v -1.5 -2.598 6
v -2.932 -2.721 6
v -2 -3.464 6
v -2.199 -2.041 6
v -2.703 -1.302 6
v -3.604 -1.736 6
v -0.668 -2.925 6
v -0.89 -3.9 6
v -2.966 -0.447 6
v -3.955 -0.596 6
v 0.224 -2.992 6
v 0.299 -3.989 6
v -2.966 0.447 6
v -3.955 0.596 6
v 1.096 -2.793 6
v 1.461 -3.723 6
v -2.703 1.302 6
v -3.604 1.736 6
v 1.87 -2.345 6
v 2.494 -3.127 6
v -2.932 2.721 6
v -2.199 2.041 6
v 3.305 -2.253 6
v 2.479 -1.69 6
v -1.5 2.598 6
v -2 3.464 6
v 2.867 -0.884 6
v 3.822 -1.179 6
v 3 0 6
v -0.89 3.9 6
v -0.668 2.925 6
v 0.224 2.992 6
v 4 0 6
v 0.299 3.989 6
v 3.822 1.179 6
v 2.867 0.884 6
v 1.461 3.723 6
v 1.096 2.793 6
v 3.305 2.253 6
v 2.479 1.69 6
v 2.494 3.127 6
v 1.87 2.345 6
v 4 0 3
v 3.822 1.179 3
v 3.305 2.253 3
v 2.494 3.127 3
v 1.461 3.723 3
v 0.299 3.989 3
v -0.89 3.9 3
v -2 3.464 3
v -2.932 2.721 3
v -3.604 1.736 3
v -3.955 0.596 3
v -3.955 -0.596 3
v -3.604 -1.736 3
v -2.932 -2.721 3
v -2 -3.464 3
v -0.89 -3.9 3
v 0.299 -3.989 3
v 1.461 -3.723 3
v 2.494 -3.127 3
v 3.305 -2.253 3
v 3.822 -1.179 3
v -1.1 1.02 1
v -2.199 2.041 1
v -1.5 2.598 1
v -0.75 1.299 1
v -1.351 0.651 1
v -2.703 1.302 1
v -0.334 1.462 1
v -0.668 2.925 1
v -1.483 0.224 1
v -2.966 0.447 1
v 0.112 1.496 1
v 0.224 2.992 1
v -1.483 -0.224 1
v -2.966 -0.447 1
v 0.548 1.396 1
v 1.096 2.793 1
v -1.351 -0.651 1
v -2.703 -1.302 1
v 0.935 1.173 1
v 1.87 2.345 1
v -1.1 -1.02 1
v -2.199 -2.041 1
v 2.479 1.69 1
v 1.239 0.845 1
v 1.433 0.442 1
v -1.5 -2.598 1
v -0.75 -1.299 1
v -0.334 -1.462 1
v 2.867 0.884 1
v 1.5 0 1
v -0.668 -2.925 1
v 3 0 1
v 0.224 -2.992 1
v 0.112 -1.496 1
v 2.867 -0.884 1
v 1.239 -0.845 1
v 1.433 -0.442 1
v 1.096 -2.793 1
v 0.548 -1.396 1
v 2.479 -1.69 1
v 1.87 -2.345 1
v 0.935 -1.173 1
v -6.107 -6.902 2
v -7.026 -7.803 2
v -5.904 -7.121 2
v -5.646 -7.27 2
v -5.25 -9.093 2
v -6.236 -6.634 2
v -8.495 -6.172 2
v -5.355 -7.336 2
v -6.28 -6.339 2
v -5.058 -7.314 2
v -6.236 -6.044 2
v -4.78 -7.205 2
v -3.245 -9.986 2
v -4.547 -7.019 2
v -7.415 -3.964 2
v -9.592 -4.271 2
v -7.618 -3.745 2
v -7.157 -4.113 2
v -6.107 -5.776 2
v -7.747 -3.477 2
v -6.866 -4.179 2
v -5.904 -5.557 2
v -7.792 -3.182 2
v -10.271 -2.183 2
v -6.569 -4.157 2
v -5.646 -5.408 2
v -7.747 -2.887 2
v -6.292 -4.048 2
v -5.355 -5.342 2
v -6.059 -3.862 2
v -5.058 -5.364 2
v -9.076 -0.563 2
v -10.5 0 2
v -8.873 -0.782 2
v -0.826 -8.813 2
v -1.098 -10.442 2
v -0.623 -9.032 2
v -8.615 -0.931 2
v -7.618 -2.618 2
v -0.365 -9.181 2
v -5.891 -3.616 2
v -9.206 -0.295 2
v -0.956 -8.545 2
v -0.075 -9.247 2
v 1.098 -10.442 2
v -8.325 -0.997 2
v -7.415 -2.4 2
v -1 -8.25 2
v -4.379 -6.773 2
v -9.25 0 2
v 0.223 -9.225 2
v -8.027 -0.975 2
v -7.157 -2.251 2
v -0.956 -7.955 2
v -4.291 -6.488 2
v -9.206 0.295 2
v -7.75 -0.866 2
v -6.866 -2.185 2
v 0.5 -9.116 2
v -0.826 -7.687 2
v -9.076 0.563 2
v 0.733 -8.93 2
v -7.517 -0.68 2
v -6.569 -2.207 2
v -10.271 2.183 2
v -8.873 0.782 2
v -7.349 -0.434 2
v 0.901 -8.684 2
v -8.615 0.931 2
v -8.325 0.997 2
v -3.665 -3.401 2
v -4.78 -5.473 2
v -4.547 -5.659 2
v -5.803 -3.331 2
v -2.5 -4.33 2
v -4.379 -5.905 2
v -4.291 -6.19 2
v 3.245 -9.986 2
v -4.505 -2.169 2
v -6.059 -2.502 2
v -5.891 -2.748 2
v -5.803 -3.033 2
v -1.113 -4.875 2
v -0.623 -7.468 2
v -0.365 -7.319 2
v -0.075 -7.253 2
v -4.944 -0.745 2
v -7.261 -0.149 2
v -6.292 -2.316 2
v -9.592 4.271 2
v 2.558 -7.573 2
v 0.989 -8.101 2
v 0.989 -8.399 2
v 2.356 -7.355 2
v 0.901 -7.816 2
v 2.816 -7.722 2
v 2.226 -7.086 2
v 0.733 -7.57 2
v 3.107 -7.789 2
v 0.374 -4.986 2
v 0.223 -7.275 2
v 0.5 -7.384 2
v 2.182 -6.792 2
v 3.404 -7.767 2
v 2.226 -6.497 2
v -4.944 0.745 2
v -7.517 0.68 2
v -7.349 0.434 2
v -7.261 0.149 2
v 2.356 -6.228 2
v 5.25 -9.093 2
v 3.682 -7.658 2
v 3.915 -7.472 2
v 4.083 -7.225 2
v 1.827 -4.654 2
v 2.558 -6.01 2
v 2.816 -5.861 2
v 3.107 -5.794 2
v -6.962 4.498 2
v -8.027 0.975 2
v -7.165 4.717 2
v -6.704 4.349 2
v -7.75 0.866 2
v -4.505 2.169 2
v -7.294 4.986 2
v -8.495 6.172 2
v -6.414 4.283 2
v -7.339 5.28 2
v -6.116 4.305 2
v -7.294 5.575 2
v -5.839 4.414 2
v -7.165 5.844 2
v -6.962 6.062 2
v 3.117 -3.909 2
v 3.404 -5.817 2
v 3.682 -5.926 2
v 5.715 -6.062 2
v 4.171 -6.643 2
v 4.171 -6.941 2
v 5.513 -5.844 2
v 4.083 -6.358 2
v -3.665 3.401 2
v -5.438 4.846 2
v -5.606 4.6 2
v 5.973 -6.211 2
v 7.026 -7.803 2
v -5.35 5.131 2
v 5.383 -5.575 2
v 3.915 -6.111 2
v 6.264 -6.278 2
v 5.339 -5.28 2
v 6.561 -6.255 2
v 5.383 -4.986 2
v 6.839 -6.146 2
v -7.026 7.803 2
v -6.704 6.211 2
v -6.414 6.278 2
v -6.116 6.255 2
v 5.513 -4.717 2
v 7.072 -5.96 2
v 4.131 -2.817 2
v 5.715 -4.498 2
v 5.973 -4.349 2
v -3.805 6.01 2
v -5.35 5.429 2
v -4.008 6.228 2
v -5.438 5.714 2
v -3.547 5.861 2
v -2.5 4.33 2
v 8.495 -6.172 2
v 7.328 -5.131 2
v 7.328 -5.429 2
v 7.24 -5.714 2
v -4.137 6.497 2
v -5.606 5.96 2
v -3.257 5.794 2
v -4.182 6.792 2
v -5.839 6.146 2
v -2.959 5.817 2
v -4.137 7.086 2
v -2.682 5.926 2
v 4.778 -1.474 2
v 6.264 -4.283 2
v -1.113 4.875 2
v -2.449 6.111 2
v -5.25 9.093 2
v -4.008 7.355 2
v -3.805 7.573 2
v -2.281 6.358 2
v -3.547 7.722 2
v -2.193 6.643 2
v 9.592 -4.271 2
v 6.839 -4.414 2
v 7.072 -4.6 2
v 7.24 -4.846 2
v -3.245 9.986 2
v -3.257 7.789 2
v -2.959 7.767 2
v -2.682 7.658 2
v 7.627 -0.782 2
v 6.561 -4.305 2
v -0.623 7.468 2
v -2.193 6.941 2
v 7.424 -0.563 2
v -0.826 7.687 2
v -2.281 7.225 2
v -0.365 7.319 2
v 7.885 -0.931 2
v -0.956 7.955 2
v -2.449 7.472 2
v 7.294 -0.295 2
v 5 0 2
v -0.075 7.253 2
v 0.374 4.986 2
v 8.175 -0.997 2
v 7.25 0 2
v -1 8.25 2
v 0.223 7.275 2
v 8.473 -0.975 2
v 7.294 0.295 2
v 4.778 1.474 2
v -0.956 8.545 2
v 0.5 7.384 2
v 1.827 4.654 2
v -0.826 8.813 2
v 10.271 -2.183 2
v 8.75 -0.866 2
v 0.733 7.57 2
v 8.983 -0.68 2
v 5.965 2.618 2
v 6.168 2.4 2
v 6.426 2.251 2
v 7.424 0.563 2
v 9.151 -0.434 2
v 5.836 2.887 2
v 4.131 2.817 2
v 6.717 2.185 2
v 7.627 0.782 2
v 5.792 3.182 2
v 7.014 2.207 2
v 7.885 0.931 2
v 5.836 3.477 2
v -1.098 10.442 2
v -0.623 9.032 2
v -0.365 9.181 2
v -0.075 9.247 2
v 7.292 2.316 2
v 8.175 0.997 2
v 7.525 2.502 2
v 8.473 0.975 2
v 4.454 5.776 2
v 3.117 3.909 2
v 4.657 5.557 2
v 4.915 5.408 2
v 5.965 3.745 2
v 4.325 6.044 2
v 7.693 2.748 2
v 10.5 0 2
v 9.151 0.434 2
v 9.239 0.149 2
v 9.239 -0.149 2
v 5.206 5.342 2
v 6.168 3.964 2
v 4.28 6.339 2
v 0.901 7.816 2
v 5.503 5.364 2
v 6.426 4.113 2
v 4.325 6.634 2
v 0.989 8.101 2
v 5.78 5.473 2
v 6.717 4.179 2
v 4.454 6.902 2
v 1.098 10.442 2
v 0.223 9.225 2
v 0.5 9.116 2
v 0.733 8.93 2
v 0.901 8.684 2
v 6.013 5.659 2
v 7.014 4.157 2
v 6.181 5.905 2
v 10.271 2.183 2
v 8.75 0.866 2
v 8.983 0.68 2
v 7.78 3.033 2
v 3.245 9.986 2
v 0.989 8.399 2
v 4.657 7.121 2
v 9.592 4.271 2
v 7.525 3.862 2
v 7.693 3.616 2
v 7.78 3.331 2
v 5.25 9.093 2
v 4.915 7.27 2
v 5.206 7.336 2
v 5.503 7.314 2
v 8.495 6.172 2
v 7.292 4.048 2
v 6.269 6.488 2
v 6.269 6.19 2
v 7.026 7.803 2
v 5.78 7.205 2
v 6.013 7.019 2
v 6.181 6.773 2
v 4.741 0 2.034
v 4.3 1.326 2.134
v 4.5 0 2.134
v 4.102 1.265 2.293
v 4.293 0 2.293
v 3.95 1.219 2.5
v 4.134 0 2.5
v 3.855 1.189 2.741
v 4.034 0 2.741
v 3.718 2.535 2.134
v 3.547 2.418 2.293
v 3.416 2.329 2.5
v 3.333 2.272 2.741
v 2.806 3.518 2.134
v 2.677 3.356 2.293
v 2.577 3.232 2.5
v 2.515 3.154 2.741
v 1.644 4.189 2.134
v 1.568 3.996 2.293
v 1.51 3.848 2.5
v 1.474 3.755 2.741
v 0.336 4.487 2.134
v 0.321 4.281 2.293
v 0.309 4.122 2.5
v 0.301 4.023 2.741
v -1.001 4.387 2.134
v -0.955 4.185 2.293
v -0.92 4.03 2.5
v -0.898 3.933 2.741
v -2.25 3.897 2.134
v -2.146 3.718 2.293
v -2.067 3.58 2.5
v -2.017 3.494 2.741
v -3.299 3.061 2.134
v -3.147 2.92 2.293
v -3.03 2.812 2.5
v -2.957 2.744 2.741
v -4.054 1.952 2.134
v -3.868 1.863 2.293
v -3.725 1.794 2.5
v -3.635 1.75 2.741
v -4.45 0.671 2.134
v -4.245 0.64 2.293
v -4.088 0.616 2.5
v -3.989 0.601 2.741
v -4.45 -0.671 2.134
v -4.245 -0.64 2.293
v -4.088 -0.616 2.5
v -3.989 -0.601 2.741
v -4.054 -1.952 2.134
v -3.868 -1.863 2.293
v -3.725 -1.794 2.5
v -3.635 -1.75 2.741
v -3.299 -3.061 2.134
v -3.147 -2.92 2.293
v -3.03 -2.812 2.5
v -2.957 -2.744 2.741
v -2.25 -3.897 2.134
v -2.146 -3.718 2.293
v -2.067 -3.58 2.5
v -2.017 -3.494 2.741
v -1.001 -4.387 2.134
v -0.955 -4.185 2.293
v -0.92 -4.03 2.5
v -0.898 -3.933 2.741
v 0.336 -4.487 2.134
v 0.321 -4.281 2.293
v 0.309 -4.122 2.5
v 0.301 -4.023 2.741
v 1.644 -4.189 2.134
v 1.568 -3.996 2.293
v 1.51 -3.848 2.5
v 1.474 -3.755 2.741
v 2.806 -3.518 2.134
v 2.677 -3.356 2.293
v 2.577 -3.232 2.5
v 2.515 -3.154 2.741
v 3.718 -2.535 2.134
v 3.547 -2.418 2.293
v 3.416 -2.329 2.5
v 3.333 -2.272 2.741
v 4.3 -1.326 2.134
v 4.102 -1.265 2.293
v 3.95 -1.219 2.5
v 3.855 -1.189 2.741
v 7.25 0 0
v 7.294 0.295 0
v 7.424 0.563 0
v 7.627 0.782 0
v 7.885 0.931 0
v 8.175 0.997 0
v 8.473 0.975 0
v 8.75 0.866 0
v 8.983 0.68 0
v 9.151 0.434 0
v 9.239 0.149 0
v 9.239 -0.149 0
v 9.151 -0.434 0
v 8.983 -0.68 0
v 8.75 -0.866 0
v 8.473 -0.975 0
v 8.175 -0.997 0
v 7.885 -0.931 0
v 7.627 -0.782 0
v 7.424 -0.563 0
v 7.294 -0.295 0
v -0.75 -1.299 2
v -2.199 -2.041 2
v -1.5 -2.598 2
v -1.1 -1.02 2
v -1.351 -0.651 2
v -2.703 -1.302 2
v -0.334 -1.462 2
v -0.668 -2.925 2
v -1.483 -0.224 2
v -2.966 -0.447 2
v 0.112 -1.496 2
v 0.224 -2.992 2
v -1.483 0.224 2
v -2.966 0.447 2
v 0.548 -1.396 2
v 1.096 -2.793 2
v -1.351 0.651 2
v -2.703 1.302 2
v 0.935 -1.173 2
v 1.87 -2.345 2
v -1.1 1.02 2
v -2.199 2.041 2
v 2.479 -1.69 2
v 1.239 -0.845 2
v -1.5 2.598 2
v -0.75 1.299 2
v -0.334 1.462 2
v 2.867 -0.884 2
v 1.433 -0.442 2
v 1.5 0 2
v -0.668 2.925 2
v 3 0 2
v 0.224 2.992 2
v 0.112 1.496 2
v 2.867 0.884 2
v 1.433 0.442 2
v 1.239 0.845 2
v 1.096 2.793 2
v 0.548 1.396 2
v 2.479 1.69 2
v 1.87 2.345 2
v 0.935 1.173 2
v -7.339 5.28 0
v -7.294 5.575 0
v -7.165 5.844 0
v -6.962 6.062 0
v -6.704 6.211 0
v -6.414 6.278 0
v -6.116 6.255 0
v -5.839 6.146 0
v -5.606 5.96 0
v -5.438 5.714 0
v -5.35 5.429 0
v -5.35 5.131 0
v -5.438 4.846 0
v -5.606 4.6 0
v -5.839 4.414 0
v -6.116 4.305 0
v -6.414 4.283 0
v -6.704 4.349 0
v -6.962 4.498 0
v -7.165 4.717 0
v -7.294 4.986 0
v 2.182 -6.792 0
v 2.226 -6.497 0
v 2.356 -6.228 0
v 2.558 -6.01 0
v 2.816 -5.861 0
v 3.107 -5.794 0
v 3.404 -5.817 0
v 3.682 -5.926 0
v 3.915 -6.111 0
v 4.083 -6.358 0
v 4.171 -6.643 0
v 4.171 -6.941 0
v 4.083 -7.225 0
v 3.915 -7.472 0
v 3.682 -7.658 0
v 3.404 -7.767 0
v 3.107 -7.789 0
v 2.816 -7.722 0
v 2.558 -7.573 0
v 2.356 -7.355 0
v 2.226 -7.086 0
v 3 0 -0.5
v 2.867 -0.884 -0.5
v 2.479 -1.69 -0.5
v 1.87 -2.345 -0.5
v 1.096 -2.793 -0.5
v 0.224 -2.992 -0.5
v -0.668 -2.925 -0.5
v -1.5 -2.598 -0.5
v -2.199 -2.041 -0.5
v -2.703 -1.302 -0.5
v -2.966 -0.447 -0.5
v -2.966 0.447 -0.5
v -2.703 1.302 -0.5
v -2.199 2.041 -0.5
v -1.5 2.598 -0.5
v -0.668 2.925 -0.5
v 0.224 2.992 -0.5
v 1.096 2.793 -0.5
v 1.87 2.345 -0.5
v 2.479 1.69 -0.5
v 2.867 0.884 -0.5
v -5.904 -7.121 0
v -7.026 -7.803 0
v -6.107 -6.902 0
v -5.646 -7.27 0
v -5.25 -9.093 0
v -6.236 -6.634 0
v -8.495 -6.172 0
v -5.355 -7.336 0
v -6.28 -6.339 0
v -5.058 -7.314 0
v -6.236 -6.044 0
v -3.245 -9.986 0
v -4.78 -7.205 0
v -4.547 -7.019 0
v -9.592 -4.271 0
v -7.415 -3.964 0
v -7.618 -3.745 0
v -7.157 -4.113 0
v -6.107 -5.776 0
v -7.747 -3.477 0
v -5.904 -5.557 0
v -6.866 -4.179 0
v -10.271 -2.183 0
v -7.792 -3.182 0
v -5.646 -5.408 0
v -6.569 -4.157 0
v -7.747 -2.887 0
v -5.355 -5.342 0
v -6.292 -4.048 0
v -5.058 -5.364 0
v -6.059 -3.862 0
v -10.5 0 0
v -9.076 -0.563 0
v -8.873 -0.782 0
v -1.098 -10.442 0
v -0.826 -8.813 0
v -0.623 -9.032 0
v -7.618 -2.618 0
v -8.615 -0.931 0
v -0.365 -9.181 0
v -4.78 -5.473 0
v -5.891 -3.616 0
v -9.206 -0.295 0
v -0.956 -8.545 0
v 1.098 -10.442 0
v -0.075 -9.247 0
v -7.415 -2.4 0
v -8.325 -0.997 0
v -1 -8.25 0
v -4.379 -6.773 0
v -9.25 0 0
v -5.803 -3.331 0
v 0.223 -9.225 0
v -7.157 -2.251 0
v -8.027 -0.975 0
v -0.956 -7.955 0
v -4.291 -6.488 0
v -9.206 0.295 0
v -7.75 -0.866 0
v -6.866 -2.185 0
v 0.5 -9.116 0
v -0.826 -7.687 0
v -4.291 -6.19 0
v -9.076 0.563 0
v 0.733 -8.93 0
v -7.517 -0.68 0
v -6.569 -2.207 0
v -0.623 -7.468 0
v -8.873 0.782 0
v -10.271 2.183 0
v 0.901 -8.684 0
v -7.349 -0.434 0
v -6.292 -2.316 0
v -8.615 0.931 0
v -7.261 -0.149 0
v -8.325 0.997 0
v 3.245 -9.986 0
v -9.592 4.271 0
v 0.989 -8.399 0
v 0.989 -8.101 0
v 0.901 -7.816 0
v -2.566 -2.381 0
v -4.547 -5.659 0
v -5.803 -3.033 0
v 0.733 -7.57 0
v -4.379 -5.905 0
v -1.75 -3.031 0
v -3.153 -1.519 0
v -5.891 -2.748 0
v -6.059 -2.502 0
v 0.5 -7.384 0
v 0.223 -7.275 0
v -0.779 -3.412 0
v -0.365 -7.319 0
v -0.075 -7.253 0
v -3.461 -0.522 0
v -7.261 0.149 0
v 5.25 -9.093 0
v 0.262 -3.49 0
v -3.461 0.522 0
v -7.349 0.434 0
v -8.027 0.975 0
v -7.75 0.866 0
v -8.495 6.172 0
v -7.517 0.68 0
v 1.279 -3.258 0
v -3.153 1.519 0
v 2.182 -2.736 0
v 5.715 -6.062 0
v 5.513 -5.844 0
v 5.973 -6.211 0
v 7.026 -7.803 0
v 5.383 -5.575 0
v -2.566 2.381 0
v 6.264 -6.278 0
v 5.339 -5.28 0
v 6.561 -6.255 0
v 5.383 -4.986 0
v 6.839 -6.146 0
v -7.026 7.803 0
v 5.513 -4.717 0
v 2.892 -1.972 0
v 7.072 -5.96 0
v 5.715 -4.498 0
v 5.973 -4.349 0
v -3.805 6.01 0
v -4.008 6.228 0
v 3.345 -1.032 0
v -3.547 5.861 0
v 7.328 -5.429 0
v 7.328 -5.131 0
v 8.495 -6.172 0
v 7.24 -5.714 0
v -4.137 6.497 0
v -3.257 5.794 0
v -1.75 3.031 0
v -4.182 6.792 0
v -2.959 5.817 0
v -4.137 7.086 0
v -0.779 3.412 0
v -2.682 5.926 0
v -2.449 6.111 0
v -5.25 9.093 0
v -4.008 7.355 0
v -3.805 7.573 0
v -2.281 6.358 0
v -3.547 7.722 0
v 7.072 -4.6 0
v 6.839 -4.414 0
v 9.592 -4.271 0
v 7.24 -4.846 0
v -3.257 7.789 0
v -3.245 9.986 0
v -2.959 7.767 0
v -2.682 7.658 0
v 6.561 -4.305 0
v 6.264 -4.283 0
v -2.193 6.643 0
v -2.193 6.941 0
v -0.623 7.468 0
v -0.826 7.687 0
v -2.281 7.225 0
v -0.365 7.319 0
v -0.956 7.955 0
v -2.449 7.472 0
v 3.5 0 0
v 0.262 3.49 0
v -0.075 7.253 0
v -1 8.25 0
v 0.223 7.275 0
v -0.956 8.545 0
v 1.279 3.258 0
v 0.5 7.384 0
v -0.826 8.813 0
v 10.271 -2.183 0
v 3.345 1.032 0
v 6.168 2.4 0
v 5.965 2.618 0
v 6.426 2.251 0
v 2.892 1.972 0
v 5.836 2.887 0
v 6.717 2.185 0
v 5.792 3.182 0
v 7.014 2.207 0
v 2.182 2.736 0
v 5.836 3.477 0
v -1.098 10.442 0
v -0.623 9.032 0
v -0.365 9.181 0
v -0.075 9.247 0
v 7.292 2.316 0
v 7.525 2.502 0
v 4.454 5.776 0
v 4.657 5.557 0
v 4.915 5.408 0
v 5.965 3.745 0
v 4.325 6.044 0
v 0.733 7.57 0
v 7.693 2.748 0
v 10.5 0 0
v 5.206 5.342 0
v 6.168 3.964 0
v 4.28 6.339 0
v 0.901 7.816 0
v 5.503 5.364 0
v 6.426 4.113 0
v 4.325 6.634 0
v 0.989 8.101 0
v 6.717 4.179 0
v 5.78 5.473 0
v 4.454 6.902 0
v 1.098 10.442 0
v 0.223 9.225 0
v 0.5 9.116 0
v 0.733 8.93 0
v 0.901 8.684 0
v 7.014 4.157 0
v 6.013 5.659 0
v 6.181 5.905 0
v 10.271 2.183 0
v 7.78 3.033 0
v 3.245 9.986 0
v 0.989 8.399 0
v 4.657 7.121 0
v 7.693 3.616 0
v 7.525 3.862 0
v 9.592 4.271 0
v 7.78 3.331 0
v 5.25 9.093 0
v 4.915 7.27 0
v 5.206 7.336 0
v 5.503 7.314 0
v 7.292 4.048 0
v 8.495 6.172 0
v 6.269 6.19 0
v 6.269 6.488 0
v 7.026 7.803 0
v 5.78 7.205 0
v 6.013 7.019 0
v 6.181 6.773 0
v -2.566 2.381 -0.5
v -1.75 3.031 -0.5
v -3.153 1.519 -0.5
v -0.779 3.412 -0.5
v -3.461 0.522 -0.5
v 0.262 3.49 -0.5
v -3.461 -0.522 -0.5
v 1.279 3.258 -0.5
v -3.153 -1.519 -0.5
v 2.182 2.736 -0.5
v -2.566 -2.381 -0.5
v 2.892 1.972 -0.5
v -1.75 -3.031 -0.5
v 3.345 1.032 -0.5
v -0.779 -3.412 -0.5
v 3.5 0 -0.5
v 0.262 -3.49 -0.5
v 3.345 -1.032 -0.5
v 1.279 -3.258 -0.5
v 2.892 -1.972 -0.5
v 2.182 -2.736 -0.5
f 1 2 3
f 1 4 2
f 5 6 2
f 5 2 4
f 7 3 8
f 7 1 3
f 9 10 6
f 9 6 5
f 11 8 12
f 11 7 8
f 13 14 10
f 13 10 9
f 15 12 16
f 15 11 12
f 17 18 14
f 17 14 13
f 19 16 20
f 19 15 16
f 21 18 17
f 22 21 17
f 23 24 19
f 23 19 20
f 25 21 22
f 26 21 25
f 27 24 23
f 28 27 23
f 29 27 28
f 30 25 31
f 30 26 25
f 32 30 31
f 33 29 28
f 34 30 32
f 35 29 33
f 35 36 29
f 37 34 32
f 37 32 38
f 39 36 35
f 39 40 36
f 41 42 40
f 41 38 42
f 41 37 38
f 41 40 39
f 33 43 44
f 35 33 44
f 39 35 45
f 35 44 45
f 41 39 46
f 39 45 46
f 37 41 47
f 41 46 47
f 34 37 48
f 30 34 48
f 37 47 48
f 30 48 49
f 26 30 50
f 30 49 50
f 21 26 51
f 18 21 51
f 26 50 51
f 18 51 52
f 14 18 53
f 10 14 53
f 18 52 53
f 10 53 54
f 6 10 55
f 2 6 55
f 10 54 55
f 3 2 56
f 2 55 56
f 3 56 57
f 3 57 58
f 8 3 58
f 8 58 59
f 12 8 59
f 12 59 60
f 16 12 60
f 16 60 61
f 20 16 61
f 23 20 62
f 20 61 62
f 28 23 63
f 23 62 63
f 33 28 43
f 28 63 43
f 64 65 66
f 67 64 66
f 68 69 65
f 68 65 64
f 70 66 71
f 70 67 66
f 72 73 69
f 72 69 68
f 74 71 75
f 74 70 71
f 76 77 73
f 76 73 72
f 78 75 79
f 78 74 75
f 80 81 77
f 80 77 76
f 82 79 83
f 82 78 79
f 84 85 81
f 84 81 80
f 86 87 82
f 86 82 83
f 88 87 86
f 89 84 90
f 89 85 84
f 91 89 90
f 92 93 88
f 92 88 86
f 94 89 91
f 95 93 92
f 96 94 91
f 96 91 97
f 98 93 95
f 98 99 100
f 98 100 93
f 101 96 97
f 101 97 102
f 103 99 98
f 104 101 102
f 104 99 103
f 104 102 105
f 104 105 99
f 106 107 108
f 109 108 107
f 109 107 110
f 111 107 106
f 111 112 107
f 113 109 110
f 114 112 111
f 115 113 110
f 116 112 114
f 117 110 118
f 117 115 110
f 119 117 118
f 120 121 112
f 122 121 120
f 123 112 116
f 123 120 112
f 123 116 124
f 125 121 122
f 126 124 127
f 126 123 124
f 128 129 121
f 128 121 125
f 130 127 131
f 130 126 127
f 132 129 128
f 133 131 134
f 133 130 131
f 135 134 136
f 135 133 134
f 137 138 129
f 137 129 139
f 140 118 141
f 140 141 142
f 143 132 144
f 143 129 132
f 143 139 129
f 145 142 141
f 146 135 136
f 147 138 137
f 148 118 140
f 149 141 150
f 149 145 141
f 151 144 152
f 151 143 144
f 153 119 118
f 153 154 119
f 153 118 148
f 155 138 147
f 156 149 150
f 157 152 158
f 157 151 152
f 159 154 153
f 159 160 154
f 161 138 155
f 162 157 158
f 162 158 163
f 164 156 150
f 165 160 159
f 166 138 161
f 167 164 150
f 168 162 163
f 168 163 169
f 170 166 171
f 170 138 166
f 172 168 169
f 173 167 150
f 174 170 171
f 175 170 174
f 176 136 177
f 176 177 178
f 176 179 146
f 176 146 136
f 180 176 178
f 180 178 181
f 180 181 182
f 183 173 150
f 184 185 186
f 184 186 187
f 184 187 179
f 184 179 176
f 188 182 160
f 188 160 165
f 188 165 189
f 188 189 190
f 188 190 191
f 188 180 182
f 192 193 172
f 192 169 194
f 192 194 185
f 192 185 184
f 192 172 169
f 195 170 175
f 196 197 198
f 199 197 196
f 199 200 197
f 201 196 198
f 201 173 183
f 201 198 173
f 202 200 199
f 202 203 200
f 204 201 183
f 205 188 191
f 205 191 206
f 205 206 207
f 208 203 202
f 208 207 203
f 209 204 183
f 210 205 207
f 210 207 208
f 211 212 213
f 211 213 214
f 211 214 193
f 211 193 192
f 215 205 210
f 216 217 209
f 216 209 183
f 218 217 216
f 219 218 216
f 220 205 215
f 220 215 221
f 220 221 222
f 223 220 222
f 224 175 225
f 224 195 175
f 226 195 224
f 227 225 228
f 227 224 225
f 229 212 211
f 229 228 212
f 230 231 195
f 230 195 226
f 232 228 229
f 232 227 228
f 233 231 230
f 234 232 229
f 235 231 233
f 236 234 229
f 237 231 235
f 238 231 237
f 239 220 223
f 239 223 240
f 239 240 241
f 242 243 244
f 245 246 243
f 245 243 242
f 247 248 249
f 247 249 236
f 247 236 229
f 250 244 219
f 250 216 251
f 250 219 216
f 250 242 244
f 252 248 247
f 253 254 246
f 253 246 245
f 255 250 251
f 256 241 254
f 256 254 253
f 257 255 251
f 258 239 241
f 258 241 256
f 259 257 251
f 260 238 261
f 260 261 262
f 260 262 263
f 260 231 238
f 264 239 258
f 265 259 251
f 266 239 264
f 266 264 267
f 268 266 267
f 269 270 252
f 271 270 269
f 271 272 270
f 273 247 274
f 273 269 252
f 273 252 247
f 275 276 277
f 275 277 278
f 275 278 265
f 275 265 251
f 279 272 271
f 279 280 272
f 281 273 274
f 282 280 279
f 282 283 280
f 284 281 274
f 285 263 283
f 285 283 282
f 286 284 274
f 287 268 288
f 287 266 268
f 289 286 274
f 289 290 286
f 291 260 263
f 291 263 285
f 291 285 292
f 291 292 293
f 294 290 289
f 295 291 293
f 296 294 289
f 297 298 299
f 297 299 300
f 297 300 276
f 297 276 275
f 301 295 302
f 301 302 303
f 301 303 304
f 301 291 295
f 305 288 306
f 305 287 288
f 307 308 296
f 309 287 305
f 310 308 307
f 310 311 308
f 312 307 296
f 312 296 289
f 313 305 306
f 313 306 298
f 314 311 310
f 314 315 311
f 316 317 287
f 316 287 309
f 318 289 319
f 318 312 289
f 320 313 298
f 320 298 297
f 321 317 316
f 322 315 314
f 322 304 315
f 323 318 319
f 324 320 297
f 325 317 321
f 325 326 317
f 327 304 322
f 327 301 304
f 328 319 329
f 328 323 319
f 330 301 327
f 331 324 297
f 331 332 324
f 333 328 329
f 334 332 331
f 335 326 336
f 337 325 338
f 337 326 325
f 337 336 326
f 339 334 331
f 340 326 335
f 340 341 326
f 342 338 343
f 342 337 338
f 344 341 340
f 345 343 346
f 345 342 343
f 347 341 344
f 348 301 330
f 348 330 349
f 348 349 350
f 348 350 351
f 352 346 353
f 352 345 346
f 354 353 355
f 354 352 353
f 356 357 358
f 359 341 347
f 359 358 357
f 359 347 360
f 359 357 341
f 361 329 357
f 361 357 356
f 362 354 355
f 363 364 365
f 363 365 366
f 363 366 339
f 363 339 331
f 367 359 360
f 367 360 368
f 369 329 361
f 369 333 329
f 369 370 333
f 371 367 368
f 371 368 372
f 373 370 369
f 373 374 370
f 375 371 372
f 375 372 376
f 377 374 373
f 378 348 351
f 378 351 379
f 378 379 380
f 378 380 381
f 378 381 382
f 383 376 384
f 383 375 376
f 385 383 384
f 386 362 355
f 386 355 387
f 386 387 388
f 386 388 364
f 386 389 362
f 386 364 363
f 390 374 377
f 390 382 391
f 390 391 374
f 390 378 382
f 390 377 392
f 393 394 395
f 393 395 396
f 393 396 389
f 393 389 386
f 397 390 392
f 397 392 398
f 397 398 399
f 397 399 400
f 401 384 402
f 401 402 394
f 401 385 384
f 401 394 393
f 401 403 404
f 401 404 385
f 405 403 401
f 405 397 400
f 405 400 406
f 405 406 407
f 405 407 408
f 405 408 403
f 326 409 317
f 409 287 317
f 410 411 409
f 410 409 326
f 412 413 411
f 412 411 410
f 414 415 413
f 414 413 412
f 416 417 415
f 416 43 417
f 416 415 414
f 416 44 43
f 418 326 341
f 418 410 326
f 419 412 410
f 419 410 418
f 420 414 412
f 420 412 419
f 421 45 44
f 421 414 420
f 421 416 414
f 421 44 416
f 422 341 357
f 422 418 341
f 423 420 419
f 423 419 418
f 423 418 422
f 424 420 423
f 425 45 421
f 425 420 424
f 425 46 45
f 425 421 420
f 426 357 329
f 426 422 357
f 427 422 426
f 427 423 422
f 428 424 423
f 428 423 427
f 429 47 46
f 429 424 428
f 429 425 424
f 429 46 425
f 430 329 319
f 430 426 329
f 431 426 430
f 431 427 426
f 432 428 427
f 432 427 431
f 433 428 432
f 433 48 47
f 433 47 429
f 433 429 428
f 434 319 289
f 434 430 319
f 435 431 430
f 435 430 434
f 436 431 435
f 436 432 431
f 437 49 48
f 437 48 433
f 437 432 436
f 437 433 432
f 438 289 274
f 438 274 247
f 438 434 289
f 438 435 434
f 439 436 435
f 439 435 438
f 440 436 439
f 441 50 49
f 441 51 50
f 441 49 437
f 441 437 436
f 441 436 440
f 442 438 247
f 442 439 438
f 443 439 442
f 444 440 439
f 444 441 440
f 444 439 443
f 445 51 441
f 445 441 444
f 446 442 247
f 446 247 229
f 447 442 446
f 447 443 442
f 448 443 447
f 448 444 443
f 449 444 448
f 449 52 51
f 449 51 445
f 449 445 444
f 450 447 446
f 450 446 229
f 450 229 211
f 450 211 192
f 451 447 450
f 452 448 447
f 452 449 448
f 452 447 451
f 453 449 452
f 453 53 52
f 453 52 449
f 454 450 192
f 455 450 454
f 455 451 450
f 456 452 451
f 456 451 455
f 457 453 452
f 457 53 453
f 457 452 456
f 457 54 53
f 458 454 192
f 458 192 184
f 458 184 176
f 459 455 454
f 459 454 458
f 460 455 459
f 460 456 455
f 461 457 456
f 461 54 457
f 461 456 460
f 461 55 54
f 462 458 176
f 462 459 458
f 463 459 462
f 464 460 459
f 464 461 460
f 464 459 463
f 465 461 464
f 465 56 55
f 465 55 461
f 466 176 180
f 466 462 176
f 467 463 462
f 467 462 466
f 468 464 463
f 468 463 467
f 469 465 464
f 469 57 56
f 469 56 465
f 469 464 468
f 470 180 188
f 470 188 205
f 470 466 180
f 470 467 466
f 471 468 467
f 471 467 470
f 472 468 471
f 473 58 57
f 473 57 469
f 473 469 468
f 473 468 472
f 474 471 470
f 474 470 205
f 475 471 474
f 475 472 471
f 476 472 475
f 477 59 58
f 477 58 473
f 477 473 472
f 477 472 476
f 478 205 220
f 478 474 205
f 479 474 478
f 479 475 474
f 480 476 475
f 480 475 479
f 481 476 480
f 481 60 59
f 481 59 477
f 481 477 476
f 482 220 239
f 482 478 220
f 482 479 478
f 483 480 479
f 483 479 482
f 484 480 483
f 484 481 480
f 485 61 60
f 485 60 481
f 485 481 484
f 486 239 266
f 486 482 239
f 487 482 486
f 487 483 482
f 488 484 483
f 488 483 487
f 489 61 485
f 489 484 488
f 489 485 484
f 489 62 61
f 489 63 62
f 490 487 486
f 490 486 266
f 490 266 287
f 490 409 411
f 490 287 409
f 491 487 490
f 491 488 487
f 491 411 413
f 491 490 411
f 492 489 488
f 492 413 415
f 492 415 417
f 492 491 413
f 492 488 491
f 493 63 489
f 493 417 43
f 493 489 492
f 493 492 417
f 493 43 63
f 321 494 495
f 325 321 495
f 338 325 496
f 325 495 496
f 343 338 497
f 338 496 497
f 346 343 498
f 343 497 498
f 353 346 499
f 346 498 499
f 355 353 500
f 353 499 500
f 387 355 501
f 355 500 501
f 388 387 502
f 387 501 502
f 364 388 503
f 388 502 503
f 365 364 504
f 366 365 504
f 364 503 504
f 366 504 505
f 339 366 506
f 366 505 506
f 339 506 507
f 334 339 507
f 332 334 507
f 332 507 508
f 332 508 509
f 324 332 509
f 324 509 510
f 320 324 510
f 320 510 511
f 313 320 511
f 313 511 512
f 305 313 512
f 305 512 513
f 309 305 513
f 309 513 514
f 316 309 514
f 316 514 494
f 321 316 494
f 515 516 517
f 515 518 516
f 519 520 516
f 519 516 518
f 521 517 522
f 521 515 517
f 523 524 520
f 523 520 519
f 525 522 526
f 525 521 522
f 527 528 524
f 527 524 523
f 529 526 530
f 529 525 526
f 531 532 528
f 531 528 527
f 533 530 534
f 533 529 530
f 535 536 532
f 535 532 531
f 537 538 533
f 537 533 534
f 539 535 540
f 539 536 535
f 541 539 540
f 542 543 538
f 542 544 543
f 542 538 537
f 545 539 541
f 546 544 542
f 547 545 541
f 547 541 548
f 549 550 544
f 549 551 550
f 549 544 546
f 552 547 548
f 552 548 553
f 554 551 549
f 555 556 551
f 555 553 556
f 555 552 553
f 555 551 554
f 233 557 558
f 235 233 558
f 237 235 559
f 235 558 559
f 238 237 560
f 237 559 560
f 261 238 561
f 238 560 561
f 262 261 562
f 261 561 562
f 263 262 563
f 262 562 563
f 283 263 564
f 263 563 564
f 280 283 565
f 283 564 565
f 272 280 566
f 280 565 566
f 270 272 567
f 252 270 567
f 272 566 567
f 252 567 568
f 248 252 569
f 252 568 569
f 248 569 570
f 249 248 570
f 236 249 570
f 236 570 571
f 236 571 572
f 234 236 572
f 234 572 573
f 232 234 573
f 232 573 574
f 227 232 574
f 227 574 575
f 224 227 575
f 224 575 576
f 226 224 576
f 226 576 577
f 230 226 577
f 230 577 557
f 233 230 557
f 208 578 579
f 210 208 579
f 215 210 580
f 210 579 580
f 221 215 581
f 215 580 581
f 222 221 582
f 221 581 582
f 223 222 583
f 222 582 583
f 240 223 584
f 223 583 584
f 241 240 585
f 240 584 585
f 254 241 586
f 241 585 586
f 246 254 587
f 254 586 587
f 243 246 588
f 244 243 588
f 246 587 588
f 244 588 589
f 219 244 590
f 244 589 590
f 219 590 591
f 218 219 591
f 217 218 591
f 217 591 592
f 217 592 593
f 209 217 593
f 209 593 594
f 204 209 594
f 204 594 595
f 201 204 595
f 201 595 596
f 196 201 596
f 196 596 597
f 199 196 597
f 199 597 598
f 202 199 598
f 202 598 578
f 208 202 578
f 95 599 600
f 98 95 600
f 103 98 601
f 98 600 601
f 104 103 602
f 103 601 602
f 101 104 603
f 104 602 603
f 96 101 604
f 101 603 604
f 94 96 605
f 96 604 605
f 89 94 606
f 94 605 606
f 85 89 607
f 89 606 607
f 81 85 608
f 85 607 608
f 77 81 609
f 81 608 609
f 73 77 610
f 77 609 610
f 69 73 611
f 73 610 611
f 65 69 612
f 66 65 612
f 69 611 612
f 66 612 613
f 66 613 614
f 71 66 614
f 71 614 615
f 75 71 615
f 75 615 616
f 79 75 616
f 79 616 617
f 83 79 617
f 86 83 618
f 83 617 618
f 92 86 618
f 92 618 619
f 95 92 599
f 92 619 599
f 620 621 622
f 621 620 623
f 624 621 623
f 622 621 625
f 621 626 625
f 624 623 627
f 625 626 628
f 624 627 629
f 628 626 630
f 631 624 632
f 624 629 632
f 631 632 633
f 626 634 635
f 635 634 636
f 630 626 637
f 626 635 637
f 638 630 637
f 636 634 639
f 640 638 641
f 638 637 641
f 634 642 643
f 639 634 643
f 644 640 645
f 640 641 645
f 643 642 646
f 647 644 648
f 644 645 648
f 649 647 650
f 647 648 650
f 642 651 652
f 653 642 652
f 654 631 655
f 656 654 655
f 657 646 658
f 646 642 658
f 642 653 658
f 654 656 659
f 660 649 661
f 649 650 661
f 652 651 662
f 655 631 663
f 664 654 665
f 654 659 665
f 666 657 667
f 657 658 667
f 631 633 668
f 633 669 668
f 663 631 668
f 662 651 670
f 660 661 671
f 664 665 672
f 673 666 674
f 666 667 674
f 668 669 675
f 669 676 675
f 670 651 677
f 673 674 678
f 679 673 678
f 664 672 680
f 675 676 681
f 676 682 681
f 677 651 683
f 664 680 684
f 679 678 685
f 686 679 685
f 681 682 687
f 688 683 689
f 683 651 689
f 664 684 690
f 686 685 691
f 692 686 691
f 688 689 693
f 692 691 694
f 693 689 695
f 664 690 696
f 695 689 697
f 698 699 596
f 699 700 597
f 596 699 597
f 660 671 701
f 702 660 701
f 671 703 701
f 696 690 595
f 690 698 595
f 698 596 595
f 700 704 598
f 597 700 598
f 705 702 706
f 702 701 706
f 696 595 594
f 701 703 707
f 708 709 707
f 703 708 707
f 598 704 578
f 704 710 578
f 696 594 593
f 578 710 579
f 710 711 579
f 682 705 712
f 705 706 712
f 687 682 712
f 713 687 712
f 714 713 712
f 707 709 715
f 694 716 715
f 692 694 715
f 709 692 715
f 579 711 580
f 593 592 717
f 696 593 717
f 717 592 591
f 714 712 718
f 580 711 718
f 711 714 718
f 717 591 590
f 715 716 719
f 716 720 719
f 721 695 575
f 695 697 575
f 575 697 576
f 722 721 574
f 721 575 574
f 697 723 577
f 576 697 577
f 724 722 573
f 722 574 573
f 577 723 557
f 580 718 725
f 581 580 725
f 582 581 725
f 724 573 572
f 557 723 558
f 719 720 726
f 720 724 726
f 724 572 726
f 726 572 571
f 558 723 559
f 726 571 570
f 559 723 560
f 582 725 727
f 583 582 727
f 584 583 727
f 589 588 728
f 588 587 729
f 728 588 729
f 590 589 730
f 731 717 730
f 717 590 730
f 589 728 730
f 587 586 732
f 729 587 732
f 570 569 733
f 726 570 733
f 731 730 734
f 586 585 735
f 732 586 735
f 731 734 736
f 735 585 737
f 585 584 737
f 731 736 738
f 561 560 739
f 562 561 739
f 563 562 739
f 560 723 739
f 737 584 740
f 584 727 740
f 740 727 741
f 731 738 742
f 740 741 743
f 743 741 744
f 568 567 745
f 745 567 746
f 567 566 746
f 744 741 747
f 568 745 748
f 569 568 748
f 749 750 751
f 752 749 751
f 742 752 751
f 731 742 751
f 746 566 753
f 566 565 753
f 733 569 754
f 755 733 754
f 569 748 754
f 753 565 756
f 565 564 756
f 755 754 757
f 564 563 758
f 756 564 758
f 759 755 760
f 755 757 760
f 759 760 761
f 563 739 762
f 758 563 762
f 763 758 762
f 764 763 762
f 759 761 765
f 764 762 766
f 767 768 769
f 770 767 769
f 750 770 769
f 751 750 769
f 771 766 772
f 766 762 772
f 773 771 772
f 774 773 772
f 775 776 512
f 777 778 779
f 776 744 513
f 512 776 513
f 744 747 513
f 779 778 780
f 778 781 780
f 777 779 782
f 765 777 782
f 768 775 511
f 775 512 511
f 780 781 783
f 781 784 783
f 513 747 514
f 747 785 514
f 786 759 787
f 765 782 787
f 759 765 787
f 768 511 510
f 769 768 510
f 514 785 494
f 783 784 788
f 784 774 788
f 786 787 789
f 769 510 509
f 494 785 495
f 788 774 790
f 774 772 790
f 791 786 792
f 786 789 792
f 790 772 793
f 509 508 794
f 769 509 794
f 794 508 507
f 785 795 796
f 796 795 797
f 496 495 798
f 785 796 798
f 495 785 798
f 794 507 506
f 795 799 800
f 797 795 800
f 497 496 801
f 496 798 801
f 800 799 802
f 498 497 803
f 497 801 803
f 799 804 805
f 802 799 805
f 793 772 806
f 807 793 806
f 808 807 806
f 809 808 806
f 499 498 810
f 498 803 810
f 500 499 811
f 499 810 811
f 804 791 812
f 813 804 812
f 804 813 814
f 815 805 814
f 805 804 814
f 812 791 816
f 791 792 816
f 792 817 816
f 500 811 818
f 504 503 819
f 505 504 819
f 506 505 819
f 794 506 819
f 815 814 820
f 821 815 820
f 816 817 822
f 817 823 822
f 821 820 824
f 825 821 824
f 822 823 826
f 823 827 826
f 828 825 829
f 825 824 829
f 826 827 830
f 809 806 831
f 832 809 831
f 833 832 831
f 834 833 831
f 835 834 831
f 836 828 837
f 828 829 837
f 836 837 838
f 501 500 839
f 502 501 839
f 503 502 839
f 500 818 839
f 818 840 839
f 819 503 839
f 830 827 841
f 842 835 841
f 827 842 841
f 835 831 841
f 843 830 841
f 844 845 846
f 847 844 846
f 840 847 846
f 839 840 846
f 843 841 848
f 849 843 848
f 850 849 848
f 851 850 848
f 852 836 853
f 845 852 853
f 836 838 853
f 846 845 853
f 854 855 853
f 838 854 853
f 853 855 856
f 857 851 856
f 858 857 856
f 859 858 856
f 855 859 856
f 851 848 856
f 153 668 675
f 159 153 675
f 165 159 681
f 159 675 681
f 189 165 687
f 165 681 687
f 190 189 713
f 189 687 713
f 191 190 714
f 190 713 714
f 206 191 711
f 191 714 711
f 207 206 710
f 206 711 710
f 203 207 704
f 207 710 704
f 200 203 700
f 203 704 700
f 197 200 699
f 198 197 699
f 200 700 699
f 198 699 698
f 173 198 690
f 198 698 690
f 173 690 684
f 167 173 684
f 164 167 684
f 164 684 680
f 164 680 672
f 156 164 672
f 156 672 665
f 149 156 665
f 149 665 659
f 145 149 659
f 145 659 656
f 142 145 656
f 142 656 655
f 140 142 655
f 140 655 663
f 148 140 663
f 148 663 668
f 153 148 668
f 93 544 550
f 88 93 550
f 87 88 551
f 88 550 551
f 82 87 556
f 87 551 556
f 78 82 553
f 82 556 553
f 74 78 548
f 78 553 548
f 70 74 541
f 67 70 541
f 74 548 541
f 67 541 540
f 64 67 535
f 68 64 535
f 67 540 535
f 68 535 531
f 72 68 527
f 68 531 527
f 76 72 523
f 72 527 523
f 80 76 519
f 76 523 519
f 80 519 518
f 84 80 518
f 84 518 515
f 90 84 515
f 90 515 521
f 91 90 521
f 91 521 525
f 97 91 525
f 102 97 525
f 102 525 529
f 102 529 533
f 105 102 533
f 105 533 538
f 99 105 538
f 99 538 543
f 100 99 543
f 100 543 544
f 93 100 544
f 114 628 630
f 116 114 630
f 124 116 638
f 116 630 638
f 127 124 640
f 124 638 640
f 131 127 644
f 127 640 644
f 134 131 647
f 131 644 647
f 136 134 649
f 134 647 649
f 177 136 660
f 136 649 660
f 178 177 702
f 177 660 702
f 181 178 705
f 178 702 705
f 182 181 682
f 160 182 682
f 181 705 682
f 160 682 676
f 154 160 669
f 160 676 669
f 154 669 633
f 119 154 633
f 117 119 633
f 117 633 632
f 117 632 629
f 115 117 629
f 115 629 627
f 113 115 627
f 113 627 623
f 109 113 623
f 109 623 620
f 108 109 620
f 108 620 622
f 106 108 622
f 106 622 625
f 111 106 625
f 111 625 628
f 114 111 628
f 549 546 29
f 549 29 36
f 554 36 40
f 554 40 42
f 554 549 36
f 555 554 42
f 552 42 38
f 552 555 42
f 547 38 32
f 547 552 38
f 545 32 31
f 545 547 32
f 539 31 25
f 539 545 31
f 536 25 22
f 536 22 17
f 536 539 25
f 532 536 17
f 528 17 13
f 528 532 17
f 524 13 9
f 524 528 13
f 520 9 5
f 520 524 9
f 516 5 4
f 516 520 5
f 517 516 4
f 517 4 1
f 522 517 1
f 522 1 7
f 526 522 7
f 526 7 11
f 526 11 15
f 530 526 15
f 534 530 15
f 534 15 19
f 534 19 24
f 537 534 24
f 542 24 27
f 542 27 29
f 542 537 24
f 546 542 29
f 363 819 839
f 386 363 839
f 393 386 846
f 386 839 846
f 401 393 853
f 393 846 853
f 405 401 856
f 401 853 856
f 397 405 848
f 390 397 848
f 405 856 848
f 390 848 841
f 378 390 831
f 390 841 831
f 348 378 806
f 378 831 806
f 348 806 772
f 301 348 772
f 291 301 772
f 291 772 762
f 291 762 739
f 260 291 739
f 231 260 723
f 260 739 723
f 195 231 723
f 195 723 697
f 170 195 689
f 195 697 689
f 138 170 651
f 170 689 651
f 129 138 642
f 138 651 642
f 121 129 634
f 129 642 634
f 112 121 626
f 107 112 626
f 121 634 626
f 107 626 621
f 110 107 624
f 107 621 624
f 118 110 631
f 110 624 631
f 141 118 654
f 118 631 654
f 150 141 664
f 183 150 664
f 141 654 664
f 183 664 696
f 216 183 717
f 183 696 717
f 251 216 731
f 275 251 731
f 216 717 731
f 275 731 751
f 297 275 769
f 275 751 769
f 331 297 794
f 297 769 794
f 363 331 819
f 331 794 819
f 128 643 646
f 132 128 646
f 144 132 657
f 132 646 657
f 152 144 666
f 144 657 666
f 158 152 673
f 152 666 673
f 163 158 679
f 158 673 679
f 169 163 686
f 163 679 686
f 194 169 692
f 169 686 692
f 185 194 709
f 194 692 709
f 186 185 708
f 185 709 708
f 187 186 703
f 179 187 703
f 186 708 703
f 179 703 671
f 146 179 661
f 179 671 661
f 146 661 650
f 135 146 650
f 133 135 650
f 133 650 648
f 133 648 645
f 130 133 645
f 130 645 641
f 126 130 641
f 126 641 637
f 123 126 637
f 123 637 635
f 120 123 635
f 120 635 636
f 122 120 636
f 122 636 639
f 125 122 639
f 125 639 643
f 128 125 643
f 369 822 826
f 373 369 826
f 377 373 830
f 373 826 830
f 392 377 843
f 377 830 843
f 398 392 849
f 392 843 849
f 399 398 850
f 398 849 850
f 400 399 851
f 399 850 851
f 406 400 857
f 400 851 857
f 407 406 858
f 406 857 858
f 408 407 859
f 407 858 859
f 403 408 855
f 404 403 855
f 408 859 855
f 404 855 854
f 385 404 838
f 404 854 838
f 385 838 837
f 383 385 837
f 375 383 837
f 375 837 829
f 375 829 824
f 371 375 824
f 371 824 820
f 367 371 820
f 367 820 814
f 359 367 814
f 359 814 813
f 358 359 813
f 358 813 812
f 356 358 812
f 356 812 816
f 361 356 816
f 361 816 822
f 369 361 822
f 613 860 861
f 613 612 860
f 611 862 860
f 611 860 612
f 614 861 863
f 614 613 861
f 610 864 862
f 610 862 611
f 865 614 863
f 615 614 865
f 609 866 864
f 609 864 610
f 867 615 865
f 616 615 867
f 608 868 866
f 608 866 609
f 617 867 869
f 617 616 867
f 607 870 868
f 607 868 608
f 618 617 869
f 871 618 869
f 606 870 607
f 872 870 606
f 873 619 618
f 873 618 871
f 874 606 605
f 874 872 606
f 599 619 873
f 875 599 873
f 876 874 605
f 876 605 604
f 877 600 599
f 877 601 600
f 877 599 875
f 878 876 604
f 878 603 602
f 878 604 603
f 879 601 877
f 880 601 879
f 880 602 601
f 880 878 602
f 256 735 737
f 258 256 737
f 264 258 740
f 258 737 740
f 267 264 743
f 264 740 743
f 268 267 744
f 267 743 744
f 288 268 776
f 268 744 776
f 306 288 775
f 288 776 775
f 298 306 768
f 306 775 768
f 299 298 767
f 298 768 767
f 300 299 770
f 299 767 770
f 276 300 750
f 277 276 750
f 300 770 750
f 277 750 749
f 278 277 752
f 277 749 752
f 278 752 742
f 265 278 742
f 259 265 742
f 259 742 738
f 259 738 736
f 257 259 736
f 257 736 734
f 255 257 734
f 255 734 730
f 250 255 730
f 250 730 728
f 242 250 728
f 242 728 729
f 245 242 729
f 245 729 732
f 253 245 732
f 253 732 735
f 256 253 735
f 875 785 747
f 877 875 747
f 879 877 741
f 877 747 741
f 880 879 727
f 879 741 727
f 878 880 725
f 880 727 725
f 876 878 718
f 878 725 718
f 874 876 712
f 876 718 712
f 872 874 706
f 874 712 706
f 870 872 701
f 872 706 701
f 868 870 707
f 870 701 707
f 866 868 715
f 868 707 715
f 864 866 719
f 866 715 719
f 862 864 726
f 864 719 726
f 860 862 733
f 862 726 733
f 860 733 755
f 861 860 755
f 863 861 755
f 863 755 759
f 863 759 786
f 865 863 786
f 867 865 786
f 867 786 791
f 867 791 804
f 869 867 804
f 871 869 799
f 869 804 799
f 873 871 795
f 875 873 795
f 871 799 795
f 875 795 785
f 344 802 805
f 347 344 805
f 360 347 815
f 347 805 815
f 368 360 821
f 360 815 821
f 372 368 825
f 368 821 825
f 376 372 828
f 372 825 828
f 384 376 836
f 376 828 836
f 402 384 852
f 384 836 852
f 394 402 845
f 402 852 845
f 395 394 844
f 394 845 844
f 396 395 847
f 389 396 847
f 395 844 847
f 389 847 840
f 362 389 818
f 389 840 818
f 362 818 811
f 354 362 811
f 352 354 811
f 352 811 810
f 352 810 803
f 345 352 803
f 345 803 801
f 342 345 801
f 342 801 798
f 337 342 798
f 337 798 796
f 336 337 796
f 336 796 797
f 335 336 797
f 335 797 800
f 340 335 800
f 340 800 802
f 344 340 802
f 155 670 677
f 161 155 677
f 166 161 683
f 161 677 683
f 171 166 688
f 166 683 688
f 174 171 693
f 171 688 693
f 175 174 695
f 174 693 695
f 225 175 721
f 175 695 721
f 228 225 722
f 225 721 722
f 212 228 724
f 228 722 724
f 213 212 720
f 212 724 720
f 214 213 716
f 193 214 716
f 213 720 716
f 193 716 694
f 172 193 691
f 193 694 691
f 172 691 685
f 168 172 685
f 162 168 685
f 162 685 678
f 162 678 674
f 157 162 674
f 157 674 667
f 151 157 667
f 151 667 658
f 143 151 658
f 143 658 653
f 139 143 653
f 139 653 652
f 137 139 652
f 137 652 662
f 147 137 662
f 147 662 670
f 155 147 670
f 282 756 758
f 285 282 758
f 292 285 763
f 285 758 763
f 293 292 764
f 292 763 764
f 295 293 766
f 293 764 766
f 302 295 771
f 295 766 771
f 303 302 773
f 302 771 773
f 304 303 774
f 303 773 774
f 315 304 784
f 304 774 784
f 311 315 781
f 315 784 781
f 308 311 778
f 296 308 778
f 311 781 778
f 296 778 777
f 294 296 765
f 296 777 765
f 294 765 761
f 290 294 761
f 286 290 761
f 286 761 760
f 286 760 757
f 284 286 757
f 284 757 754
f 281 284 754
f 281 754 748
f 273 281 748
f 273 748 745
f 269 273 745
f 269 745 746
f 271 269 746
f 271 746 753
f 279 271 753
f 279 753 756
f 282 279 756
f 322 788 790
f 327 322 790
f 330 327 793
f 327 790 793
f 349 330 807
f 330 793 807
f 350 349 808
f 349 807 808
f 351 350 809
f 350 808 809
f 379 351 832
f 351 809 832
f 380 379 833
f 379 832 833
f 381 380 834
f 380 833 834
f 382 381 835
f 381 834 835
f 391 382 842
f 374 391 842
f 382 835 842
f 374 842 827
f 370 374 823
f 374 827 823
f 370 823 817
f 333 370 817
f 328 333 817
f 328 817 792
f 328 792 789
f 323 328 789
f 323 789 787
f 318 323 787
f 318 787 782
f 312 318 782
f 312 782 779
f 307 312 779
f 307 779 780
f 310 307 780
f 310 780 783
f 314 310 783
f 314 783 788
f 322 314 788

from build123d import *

# Parameters (mm, degrees)
SKETCH_1_R          = 10.5
EXTRUDE_1_DEPTH     = 2
SKETCH_2_R          = 4
SKETCH_2_R_2        = 3
EXTRUDE_2_DEPTH     = 4
SKETCH_5_R          = 1.5
CUT_EXTRUDE_2_DEPTH = 16.378556499
FILLET_1_R          = 1
SKETCH_6_R          = 3.5
EXTRUDE_3_DEPTH     = 0.5
SKETCH_8_R          = 3
CUT_EXTRUDE_3_DEPTH = 1.5
SKETCH_9_R          = 1
CUT_EXTRUDE_5_DEPTH = 17.015617378


with BuildPart() as part:
    # 草圖1 → 伸長1 (new body)
    with BuildSketch(Plane.XY):
        Circle(SKETCH_1_R)
    extrude(amount=EXTRUDE_1_DEPTH)

    # 草圖2 → 伸長2 (add)
    with BuildSketch(Plane.XY.offset(2)):
        Circle(SKETCH_2_R)
        Circle(SKETCH_2_R_2, mode=Mode.SUBTRACT)
    extrude(amount=EXTRUDE_2_DEPTH)

    # 草圖5 → 除料-伸長2 (cut, through all)
    with BuildSketch(Plane.XY.offset(2)):
        Circle(SKETCH_5_R)
    extrude(amount=-CUT_EXTRUDE_2_DEPTH, mode=Mode.SUBTRACT)

    # 圓角1
    fillet_1_edges = [part.edges().sort_by_distance(p)[0] for p in [
        (-4, 0, 2),
    ]]
    fillet(fillet_1_edges, radius=FILLET_1_R)

    # 草圖6 → 伸長3 (add)
    with BuildSketch(Plane(origin=(0, 0, 0), x_dir=(-1, 0, 0), z_dir=(0, 0, -1))):
        with Locations(Location((0, 0, 0), (0, 0, 180))):
            Circle(SKETCH_6_R)
    extrude(amount=EXTRUDE_3_DEPTH)

    # 草圖8 → 除料-伸長3 (cut)
    with BuildSketch(Plane(origin=(0, 0, -0.5), x_dir=(-1, 0, 0), z_dir=(0, 0, -1))):
        with Locations(Location((0, 0, 0), (0, 0, 180))):
            Circle(SKETCH_8_R)
    extrude(amount=-CUT_EXTRUDE_3_DEPTH, mode=Mode.SUBTRACT)

    # 草圖9 → 除料-伸長5 (cut, through all)
    with BuildSketch(Plane(origin=(0, 0, 0), x_dir=(-1, 0, 0), z_dir=(0, 0, -1))):
        with Locations((8.25, 0)):
            Circle(SKETCH_9_R)
        with Locations((0, -8.25)):
            Circle(SKETCH_9_R)
        with Locations((-8.25, 0)):
            Circle(SKETCH_9_R)
        with Locations((0, 8.25)):
            Circle(SKETCH_9_R)
        with Locations((5.28030303, -6.338840581)):
            Circle(SKETCH_9_R)
        with Locations((-6.338840581, -5.28030303)):
            Circle(SKETCH_9_R)
        with Locations((-5.28030303, 6.338840581)):
            Circle(SKETCH_9_R)
        with Locations((6.338840581, 5.28030303)):
            Circle(SKETCH_9_R)
        with Locations((6.791614908, -3.181818182)):
            Circle(SKETCH_9_R)
        with Locations((-3.181818182, -6.791614908)):
            Circle(SKETCH_9_R)
        with Locations((-6.791614908, 3.181818182)):
            Circle(SKETCH_9_R)
        with Locations((3.181818182, 6.791614908)):
            Circle(SKETCH_9_R)
    extrude(amount=-CUT_EXTRUDE_5_DEPTH, mode=Mode.SUBTRACT)


solid = part.part
